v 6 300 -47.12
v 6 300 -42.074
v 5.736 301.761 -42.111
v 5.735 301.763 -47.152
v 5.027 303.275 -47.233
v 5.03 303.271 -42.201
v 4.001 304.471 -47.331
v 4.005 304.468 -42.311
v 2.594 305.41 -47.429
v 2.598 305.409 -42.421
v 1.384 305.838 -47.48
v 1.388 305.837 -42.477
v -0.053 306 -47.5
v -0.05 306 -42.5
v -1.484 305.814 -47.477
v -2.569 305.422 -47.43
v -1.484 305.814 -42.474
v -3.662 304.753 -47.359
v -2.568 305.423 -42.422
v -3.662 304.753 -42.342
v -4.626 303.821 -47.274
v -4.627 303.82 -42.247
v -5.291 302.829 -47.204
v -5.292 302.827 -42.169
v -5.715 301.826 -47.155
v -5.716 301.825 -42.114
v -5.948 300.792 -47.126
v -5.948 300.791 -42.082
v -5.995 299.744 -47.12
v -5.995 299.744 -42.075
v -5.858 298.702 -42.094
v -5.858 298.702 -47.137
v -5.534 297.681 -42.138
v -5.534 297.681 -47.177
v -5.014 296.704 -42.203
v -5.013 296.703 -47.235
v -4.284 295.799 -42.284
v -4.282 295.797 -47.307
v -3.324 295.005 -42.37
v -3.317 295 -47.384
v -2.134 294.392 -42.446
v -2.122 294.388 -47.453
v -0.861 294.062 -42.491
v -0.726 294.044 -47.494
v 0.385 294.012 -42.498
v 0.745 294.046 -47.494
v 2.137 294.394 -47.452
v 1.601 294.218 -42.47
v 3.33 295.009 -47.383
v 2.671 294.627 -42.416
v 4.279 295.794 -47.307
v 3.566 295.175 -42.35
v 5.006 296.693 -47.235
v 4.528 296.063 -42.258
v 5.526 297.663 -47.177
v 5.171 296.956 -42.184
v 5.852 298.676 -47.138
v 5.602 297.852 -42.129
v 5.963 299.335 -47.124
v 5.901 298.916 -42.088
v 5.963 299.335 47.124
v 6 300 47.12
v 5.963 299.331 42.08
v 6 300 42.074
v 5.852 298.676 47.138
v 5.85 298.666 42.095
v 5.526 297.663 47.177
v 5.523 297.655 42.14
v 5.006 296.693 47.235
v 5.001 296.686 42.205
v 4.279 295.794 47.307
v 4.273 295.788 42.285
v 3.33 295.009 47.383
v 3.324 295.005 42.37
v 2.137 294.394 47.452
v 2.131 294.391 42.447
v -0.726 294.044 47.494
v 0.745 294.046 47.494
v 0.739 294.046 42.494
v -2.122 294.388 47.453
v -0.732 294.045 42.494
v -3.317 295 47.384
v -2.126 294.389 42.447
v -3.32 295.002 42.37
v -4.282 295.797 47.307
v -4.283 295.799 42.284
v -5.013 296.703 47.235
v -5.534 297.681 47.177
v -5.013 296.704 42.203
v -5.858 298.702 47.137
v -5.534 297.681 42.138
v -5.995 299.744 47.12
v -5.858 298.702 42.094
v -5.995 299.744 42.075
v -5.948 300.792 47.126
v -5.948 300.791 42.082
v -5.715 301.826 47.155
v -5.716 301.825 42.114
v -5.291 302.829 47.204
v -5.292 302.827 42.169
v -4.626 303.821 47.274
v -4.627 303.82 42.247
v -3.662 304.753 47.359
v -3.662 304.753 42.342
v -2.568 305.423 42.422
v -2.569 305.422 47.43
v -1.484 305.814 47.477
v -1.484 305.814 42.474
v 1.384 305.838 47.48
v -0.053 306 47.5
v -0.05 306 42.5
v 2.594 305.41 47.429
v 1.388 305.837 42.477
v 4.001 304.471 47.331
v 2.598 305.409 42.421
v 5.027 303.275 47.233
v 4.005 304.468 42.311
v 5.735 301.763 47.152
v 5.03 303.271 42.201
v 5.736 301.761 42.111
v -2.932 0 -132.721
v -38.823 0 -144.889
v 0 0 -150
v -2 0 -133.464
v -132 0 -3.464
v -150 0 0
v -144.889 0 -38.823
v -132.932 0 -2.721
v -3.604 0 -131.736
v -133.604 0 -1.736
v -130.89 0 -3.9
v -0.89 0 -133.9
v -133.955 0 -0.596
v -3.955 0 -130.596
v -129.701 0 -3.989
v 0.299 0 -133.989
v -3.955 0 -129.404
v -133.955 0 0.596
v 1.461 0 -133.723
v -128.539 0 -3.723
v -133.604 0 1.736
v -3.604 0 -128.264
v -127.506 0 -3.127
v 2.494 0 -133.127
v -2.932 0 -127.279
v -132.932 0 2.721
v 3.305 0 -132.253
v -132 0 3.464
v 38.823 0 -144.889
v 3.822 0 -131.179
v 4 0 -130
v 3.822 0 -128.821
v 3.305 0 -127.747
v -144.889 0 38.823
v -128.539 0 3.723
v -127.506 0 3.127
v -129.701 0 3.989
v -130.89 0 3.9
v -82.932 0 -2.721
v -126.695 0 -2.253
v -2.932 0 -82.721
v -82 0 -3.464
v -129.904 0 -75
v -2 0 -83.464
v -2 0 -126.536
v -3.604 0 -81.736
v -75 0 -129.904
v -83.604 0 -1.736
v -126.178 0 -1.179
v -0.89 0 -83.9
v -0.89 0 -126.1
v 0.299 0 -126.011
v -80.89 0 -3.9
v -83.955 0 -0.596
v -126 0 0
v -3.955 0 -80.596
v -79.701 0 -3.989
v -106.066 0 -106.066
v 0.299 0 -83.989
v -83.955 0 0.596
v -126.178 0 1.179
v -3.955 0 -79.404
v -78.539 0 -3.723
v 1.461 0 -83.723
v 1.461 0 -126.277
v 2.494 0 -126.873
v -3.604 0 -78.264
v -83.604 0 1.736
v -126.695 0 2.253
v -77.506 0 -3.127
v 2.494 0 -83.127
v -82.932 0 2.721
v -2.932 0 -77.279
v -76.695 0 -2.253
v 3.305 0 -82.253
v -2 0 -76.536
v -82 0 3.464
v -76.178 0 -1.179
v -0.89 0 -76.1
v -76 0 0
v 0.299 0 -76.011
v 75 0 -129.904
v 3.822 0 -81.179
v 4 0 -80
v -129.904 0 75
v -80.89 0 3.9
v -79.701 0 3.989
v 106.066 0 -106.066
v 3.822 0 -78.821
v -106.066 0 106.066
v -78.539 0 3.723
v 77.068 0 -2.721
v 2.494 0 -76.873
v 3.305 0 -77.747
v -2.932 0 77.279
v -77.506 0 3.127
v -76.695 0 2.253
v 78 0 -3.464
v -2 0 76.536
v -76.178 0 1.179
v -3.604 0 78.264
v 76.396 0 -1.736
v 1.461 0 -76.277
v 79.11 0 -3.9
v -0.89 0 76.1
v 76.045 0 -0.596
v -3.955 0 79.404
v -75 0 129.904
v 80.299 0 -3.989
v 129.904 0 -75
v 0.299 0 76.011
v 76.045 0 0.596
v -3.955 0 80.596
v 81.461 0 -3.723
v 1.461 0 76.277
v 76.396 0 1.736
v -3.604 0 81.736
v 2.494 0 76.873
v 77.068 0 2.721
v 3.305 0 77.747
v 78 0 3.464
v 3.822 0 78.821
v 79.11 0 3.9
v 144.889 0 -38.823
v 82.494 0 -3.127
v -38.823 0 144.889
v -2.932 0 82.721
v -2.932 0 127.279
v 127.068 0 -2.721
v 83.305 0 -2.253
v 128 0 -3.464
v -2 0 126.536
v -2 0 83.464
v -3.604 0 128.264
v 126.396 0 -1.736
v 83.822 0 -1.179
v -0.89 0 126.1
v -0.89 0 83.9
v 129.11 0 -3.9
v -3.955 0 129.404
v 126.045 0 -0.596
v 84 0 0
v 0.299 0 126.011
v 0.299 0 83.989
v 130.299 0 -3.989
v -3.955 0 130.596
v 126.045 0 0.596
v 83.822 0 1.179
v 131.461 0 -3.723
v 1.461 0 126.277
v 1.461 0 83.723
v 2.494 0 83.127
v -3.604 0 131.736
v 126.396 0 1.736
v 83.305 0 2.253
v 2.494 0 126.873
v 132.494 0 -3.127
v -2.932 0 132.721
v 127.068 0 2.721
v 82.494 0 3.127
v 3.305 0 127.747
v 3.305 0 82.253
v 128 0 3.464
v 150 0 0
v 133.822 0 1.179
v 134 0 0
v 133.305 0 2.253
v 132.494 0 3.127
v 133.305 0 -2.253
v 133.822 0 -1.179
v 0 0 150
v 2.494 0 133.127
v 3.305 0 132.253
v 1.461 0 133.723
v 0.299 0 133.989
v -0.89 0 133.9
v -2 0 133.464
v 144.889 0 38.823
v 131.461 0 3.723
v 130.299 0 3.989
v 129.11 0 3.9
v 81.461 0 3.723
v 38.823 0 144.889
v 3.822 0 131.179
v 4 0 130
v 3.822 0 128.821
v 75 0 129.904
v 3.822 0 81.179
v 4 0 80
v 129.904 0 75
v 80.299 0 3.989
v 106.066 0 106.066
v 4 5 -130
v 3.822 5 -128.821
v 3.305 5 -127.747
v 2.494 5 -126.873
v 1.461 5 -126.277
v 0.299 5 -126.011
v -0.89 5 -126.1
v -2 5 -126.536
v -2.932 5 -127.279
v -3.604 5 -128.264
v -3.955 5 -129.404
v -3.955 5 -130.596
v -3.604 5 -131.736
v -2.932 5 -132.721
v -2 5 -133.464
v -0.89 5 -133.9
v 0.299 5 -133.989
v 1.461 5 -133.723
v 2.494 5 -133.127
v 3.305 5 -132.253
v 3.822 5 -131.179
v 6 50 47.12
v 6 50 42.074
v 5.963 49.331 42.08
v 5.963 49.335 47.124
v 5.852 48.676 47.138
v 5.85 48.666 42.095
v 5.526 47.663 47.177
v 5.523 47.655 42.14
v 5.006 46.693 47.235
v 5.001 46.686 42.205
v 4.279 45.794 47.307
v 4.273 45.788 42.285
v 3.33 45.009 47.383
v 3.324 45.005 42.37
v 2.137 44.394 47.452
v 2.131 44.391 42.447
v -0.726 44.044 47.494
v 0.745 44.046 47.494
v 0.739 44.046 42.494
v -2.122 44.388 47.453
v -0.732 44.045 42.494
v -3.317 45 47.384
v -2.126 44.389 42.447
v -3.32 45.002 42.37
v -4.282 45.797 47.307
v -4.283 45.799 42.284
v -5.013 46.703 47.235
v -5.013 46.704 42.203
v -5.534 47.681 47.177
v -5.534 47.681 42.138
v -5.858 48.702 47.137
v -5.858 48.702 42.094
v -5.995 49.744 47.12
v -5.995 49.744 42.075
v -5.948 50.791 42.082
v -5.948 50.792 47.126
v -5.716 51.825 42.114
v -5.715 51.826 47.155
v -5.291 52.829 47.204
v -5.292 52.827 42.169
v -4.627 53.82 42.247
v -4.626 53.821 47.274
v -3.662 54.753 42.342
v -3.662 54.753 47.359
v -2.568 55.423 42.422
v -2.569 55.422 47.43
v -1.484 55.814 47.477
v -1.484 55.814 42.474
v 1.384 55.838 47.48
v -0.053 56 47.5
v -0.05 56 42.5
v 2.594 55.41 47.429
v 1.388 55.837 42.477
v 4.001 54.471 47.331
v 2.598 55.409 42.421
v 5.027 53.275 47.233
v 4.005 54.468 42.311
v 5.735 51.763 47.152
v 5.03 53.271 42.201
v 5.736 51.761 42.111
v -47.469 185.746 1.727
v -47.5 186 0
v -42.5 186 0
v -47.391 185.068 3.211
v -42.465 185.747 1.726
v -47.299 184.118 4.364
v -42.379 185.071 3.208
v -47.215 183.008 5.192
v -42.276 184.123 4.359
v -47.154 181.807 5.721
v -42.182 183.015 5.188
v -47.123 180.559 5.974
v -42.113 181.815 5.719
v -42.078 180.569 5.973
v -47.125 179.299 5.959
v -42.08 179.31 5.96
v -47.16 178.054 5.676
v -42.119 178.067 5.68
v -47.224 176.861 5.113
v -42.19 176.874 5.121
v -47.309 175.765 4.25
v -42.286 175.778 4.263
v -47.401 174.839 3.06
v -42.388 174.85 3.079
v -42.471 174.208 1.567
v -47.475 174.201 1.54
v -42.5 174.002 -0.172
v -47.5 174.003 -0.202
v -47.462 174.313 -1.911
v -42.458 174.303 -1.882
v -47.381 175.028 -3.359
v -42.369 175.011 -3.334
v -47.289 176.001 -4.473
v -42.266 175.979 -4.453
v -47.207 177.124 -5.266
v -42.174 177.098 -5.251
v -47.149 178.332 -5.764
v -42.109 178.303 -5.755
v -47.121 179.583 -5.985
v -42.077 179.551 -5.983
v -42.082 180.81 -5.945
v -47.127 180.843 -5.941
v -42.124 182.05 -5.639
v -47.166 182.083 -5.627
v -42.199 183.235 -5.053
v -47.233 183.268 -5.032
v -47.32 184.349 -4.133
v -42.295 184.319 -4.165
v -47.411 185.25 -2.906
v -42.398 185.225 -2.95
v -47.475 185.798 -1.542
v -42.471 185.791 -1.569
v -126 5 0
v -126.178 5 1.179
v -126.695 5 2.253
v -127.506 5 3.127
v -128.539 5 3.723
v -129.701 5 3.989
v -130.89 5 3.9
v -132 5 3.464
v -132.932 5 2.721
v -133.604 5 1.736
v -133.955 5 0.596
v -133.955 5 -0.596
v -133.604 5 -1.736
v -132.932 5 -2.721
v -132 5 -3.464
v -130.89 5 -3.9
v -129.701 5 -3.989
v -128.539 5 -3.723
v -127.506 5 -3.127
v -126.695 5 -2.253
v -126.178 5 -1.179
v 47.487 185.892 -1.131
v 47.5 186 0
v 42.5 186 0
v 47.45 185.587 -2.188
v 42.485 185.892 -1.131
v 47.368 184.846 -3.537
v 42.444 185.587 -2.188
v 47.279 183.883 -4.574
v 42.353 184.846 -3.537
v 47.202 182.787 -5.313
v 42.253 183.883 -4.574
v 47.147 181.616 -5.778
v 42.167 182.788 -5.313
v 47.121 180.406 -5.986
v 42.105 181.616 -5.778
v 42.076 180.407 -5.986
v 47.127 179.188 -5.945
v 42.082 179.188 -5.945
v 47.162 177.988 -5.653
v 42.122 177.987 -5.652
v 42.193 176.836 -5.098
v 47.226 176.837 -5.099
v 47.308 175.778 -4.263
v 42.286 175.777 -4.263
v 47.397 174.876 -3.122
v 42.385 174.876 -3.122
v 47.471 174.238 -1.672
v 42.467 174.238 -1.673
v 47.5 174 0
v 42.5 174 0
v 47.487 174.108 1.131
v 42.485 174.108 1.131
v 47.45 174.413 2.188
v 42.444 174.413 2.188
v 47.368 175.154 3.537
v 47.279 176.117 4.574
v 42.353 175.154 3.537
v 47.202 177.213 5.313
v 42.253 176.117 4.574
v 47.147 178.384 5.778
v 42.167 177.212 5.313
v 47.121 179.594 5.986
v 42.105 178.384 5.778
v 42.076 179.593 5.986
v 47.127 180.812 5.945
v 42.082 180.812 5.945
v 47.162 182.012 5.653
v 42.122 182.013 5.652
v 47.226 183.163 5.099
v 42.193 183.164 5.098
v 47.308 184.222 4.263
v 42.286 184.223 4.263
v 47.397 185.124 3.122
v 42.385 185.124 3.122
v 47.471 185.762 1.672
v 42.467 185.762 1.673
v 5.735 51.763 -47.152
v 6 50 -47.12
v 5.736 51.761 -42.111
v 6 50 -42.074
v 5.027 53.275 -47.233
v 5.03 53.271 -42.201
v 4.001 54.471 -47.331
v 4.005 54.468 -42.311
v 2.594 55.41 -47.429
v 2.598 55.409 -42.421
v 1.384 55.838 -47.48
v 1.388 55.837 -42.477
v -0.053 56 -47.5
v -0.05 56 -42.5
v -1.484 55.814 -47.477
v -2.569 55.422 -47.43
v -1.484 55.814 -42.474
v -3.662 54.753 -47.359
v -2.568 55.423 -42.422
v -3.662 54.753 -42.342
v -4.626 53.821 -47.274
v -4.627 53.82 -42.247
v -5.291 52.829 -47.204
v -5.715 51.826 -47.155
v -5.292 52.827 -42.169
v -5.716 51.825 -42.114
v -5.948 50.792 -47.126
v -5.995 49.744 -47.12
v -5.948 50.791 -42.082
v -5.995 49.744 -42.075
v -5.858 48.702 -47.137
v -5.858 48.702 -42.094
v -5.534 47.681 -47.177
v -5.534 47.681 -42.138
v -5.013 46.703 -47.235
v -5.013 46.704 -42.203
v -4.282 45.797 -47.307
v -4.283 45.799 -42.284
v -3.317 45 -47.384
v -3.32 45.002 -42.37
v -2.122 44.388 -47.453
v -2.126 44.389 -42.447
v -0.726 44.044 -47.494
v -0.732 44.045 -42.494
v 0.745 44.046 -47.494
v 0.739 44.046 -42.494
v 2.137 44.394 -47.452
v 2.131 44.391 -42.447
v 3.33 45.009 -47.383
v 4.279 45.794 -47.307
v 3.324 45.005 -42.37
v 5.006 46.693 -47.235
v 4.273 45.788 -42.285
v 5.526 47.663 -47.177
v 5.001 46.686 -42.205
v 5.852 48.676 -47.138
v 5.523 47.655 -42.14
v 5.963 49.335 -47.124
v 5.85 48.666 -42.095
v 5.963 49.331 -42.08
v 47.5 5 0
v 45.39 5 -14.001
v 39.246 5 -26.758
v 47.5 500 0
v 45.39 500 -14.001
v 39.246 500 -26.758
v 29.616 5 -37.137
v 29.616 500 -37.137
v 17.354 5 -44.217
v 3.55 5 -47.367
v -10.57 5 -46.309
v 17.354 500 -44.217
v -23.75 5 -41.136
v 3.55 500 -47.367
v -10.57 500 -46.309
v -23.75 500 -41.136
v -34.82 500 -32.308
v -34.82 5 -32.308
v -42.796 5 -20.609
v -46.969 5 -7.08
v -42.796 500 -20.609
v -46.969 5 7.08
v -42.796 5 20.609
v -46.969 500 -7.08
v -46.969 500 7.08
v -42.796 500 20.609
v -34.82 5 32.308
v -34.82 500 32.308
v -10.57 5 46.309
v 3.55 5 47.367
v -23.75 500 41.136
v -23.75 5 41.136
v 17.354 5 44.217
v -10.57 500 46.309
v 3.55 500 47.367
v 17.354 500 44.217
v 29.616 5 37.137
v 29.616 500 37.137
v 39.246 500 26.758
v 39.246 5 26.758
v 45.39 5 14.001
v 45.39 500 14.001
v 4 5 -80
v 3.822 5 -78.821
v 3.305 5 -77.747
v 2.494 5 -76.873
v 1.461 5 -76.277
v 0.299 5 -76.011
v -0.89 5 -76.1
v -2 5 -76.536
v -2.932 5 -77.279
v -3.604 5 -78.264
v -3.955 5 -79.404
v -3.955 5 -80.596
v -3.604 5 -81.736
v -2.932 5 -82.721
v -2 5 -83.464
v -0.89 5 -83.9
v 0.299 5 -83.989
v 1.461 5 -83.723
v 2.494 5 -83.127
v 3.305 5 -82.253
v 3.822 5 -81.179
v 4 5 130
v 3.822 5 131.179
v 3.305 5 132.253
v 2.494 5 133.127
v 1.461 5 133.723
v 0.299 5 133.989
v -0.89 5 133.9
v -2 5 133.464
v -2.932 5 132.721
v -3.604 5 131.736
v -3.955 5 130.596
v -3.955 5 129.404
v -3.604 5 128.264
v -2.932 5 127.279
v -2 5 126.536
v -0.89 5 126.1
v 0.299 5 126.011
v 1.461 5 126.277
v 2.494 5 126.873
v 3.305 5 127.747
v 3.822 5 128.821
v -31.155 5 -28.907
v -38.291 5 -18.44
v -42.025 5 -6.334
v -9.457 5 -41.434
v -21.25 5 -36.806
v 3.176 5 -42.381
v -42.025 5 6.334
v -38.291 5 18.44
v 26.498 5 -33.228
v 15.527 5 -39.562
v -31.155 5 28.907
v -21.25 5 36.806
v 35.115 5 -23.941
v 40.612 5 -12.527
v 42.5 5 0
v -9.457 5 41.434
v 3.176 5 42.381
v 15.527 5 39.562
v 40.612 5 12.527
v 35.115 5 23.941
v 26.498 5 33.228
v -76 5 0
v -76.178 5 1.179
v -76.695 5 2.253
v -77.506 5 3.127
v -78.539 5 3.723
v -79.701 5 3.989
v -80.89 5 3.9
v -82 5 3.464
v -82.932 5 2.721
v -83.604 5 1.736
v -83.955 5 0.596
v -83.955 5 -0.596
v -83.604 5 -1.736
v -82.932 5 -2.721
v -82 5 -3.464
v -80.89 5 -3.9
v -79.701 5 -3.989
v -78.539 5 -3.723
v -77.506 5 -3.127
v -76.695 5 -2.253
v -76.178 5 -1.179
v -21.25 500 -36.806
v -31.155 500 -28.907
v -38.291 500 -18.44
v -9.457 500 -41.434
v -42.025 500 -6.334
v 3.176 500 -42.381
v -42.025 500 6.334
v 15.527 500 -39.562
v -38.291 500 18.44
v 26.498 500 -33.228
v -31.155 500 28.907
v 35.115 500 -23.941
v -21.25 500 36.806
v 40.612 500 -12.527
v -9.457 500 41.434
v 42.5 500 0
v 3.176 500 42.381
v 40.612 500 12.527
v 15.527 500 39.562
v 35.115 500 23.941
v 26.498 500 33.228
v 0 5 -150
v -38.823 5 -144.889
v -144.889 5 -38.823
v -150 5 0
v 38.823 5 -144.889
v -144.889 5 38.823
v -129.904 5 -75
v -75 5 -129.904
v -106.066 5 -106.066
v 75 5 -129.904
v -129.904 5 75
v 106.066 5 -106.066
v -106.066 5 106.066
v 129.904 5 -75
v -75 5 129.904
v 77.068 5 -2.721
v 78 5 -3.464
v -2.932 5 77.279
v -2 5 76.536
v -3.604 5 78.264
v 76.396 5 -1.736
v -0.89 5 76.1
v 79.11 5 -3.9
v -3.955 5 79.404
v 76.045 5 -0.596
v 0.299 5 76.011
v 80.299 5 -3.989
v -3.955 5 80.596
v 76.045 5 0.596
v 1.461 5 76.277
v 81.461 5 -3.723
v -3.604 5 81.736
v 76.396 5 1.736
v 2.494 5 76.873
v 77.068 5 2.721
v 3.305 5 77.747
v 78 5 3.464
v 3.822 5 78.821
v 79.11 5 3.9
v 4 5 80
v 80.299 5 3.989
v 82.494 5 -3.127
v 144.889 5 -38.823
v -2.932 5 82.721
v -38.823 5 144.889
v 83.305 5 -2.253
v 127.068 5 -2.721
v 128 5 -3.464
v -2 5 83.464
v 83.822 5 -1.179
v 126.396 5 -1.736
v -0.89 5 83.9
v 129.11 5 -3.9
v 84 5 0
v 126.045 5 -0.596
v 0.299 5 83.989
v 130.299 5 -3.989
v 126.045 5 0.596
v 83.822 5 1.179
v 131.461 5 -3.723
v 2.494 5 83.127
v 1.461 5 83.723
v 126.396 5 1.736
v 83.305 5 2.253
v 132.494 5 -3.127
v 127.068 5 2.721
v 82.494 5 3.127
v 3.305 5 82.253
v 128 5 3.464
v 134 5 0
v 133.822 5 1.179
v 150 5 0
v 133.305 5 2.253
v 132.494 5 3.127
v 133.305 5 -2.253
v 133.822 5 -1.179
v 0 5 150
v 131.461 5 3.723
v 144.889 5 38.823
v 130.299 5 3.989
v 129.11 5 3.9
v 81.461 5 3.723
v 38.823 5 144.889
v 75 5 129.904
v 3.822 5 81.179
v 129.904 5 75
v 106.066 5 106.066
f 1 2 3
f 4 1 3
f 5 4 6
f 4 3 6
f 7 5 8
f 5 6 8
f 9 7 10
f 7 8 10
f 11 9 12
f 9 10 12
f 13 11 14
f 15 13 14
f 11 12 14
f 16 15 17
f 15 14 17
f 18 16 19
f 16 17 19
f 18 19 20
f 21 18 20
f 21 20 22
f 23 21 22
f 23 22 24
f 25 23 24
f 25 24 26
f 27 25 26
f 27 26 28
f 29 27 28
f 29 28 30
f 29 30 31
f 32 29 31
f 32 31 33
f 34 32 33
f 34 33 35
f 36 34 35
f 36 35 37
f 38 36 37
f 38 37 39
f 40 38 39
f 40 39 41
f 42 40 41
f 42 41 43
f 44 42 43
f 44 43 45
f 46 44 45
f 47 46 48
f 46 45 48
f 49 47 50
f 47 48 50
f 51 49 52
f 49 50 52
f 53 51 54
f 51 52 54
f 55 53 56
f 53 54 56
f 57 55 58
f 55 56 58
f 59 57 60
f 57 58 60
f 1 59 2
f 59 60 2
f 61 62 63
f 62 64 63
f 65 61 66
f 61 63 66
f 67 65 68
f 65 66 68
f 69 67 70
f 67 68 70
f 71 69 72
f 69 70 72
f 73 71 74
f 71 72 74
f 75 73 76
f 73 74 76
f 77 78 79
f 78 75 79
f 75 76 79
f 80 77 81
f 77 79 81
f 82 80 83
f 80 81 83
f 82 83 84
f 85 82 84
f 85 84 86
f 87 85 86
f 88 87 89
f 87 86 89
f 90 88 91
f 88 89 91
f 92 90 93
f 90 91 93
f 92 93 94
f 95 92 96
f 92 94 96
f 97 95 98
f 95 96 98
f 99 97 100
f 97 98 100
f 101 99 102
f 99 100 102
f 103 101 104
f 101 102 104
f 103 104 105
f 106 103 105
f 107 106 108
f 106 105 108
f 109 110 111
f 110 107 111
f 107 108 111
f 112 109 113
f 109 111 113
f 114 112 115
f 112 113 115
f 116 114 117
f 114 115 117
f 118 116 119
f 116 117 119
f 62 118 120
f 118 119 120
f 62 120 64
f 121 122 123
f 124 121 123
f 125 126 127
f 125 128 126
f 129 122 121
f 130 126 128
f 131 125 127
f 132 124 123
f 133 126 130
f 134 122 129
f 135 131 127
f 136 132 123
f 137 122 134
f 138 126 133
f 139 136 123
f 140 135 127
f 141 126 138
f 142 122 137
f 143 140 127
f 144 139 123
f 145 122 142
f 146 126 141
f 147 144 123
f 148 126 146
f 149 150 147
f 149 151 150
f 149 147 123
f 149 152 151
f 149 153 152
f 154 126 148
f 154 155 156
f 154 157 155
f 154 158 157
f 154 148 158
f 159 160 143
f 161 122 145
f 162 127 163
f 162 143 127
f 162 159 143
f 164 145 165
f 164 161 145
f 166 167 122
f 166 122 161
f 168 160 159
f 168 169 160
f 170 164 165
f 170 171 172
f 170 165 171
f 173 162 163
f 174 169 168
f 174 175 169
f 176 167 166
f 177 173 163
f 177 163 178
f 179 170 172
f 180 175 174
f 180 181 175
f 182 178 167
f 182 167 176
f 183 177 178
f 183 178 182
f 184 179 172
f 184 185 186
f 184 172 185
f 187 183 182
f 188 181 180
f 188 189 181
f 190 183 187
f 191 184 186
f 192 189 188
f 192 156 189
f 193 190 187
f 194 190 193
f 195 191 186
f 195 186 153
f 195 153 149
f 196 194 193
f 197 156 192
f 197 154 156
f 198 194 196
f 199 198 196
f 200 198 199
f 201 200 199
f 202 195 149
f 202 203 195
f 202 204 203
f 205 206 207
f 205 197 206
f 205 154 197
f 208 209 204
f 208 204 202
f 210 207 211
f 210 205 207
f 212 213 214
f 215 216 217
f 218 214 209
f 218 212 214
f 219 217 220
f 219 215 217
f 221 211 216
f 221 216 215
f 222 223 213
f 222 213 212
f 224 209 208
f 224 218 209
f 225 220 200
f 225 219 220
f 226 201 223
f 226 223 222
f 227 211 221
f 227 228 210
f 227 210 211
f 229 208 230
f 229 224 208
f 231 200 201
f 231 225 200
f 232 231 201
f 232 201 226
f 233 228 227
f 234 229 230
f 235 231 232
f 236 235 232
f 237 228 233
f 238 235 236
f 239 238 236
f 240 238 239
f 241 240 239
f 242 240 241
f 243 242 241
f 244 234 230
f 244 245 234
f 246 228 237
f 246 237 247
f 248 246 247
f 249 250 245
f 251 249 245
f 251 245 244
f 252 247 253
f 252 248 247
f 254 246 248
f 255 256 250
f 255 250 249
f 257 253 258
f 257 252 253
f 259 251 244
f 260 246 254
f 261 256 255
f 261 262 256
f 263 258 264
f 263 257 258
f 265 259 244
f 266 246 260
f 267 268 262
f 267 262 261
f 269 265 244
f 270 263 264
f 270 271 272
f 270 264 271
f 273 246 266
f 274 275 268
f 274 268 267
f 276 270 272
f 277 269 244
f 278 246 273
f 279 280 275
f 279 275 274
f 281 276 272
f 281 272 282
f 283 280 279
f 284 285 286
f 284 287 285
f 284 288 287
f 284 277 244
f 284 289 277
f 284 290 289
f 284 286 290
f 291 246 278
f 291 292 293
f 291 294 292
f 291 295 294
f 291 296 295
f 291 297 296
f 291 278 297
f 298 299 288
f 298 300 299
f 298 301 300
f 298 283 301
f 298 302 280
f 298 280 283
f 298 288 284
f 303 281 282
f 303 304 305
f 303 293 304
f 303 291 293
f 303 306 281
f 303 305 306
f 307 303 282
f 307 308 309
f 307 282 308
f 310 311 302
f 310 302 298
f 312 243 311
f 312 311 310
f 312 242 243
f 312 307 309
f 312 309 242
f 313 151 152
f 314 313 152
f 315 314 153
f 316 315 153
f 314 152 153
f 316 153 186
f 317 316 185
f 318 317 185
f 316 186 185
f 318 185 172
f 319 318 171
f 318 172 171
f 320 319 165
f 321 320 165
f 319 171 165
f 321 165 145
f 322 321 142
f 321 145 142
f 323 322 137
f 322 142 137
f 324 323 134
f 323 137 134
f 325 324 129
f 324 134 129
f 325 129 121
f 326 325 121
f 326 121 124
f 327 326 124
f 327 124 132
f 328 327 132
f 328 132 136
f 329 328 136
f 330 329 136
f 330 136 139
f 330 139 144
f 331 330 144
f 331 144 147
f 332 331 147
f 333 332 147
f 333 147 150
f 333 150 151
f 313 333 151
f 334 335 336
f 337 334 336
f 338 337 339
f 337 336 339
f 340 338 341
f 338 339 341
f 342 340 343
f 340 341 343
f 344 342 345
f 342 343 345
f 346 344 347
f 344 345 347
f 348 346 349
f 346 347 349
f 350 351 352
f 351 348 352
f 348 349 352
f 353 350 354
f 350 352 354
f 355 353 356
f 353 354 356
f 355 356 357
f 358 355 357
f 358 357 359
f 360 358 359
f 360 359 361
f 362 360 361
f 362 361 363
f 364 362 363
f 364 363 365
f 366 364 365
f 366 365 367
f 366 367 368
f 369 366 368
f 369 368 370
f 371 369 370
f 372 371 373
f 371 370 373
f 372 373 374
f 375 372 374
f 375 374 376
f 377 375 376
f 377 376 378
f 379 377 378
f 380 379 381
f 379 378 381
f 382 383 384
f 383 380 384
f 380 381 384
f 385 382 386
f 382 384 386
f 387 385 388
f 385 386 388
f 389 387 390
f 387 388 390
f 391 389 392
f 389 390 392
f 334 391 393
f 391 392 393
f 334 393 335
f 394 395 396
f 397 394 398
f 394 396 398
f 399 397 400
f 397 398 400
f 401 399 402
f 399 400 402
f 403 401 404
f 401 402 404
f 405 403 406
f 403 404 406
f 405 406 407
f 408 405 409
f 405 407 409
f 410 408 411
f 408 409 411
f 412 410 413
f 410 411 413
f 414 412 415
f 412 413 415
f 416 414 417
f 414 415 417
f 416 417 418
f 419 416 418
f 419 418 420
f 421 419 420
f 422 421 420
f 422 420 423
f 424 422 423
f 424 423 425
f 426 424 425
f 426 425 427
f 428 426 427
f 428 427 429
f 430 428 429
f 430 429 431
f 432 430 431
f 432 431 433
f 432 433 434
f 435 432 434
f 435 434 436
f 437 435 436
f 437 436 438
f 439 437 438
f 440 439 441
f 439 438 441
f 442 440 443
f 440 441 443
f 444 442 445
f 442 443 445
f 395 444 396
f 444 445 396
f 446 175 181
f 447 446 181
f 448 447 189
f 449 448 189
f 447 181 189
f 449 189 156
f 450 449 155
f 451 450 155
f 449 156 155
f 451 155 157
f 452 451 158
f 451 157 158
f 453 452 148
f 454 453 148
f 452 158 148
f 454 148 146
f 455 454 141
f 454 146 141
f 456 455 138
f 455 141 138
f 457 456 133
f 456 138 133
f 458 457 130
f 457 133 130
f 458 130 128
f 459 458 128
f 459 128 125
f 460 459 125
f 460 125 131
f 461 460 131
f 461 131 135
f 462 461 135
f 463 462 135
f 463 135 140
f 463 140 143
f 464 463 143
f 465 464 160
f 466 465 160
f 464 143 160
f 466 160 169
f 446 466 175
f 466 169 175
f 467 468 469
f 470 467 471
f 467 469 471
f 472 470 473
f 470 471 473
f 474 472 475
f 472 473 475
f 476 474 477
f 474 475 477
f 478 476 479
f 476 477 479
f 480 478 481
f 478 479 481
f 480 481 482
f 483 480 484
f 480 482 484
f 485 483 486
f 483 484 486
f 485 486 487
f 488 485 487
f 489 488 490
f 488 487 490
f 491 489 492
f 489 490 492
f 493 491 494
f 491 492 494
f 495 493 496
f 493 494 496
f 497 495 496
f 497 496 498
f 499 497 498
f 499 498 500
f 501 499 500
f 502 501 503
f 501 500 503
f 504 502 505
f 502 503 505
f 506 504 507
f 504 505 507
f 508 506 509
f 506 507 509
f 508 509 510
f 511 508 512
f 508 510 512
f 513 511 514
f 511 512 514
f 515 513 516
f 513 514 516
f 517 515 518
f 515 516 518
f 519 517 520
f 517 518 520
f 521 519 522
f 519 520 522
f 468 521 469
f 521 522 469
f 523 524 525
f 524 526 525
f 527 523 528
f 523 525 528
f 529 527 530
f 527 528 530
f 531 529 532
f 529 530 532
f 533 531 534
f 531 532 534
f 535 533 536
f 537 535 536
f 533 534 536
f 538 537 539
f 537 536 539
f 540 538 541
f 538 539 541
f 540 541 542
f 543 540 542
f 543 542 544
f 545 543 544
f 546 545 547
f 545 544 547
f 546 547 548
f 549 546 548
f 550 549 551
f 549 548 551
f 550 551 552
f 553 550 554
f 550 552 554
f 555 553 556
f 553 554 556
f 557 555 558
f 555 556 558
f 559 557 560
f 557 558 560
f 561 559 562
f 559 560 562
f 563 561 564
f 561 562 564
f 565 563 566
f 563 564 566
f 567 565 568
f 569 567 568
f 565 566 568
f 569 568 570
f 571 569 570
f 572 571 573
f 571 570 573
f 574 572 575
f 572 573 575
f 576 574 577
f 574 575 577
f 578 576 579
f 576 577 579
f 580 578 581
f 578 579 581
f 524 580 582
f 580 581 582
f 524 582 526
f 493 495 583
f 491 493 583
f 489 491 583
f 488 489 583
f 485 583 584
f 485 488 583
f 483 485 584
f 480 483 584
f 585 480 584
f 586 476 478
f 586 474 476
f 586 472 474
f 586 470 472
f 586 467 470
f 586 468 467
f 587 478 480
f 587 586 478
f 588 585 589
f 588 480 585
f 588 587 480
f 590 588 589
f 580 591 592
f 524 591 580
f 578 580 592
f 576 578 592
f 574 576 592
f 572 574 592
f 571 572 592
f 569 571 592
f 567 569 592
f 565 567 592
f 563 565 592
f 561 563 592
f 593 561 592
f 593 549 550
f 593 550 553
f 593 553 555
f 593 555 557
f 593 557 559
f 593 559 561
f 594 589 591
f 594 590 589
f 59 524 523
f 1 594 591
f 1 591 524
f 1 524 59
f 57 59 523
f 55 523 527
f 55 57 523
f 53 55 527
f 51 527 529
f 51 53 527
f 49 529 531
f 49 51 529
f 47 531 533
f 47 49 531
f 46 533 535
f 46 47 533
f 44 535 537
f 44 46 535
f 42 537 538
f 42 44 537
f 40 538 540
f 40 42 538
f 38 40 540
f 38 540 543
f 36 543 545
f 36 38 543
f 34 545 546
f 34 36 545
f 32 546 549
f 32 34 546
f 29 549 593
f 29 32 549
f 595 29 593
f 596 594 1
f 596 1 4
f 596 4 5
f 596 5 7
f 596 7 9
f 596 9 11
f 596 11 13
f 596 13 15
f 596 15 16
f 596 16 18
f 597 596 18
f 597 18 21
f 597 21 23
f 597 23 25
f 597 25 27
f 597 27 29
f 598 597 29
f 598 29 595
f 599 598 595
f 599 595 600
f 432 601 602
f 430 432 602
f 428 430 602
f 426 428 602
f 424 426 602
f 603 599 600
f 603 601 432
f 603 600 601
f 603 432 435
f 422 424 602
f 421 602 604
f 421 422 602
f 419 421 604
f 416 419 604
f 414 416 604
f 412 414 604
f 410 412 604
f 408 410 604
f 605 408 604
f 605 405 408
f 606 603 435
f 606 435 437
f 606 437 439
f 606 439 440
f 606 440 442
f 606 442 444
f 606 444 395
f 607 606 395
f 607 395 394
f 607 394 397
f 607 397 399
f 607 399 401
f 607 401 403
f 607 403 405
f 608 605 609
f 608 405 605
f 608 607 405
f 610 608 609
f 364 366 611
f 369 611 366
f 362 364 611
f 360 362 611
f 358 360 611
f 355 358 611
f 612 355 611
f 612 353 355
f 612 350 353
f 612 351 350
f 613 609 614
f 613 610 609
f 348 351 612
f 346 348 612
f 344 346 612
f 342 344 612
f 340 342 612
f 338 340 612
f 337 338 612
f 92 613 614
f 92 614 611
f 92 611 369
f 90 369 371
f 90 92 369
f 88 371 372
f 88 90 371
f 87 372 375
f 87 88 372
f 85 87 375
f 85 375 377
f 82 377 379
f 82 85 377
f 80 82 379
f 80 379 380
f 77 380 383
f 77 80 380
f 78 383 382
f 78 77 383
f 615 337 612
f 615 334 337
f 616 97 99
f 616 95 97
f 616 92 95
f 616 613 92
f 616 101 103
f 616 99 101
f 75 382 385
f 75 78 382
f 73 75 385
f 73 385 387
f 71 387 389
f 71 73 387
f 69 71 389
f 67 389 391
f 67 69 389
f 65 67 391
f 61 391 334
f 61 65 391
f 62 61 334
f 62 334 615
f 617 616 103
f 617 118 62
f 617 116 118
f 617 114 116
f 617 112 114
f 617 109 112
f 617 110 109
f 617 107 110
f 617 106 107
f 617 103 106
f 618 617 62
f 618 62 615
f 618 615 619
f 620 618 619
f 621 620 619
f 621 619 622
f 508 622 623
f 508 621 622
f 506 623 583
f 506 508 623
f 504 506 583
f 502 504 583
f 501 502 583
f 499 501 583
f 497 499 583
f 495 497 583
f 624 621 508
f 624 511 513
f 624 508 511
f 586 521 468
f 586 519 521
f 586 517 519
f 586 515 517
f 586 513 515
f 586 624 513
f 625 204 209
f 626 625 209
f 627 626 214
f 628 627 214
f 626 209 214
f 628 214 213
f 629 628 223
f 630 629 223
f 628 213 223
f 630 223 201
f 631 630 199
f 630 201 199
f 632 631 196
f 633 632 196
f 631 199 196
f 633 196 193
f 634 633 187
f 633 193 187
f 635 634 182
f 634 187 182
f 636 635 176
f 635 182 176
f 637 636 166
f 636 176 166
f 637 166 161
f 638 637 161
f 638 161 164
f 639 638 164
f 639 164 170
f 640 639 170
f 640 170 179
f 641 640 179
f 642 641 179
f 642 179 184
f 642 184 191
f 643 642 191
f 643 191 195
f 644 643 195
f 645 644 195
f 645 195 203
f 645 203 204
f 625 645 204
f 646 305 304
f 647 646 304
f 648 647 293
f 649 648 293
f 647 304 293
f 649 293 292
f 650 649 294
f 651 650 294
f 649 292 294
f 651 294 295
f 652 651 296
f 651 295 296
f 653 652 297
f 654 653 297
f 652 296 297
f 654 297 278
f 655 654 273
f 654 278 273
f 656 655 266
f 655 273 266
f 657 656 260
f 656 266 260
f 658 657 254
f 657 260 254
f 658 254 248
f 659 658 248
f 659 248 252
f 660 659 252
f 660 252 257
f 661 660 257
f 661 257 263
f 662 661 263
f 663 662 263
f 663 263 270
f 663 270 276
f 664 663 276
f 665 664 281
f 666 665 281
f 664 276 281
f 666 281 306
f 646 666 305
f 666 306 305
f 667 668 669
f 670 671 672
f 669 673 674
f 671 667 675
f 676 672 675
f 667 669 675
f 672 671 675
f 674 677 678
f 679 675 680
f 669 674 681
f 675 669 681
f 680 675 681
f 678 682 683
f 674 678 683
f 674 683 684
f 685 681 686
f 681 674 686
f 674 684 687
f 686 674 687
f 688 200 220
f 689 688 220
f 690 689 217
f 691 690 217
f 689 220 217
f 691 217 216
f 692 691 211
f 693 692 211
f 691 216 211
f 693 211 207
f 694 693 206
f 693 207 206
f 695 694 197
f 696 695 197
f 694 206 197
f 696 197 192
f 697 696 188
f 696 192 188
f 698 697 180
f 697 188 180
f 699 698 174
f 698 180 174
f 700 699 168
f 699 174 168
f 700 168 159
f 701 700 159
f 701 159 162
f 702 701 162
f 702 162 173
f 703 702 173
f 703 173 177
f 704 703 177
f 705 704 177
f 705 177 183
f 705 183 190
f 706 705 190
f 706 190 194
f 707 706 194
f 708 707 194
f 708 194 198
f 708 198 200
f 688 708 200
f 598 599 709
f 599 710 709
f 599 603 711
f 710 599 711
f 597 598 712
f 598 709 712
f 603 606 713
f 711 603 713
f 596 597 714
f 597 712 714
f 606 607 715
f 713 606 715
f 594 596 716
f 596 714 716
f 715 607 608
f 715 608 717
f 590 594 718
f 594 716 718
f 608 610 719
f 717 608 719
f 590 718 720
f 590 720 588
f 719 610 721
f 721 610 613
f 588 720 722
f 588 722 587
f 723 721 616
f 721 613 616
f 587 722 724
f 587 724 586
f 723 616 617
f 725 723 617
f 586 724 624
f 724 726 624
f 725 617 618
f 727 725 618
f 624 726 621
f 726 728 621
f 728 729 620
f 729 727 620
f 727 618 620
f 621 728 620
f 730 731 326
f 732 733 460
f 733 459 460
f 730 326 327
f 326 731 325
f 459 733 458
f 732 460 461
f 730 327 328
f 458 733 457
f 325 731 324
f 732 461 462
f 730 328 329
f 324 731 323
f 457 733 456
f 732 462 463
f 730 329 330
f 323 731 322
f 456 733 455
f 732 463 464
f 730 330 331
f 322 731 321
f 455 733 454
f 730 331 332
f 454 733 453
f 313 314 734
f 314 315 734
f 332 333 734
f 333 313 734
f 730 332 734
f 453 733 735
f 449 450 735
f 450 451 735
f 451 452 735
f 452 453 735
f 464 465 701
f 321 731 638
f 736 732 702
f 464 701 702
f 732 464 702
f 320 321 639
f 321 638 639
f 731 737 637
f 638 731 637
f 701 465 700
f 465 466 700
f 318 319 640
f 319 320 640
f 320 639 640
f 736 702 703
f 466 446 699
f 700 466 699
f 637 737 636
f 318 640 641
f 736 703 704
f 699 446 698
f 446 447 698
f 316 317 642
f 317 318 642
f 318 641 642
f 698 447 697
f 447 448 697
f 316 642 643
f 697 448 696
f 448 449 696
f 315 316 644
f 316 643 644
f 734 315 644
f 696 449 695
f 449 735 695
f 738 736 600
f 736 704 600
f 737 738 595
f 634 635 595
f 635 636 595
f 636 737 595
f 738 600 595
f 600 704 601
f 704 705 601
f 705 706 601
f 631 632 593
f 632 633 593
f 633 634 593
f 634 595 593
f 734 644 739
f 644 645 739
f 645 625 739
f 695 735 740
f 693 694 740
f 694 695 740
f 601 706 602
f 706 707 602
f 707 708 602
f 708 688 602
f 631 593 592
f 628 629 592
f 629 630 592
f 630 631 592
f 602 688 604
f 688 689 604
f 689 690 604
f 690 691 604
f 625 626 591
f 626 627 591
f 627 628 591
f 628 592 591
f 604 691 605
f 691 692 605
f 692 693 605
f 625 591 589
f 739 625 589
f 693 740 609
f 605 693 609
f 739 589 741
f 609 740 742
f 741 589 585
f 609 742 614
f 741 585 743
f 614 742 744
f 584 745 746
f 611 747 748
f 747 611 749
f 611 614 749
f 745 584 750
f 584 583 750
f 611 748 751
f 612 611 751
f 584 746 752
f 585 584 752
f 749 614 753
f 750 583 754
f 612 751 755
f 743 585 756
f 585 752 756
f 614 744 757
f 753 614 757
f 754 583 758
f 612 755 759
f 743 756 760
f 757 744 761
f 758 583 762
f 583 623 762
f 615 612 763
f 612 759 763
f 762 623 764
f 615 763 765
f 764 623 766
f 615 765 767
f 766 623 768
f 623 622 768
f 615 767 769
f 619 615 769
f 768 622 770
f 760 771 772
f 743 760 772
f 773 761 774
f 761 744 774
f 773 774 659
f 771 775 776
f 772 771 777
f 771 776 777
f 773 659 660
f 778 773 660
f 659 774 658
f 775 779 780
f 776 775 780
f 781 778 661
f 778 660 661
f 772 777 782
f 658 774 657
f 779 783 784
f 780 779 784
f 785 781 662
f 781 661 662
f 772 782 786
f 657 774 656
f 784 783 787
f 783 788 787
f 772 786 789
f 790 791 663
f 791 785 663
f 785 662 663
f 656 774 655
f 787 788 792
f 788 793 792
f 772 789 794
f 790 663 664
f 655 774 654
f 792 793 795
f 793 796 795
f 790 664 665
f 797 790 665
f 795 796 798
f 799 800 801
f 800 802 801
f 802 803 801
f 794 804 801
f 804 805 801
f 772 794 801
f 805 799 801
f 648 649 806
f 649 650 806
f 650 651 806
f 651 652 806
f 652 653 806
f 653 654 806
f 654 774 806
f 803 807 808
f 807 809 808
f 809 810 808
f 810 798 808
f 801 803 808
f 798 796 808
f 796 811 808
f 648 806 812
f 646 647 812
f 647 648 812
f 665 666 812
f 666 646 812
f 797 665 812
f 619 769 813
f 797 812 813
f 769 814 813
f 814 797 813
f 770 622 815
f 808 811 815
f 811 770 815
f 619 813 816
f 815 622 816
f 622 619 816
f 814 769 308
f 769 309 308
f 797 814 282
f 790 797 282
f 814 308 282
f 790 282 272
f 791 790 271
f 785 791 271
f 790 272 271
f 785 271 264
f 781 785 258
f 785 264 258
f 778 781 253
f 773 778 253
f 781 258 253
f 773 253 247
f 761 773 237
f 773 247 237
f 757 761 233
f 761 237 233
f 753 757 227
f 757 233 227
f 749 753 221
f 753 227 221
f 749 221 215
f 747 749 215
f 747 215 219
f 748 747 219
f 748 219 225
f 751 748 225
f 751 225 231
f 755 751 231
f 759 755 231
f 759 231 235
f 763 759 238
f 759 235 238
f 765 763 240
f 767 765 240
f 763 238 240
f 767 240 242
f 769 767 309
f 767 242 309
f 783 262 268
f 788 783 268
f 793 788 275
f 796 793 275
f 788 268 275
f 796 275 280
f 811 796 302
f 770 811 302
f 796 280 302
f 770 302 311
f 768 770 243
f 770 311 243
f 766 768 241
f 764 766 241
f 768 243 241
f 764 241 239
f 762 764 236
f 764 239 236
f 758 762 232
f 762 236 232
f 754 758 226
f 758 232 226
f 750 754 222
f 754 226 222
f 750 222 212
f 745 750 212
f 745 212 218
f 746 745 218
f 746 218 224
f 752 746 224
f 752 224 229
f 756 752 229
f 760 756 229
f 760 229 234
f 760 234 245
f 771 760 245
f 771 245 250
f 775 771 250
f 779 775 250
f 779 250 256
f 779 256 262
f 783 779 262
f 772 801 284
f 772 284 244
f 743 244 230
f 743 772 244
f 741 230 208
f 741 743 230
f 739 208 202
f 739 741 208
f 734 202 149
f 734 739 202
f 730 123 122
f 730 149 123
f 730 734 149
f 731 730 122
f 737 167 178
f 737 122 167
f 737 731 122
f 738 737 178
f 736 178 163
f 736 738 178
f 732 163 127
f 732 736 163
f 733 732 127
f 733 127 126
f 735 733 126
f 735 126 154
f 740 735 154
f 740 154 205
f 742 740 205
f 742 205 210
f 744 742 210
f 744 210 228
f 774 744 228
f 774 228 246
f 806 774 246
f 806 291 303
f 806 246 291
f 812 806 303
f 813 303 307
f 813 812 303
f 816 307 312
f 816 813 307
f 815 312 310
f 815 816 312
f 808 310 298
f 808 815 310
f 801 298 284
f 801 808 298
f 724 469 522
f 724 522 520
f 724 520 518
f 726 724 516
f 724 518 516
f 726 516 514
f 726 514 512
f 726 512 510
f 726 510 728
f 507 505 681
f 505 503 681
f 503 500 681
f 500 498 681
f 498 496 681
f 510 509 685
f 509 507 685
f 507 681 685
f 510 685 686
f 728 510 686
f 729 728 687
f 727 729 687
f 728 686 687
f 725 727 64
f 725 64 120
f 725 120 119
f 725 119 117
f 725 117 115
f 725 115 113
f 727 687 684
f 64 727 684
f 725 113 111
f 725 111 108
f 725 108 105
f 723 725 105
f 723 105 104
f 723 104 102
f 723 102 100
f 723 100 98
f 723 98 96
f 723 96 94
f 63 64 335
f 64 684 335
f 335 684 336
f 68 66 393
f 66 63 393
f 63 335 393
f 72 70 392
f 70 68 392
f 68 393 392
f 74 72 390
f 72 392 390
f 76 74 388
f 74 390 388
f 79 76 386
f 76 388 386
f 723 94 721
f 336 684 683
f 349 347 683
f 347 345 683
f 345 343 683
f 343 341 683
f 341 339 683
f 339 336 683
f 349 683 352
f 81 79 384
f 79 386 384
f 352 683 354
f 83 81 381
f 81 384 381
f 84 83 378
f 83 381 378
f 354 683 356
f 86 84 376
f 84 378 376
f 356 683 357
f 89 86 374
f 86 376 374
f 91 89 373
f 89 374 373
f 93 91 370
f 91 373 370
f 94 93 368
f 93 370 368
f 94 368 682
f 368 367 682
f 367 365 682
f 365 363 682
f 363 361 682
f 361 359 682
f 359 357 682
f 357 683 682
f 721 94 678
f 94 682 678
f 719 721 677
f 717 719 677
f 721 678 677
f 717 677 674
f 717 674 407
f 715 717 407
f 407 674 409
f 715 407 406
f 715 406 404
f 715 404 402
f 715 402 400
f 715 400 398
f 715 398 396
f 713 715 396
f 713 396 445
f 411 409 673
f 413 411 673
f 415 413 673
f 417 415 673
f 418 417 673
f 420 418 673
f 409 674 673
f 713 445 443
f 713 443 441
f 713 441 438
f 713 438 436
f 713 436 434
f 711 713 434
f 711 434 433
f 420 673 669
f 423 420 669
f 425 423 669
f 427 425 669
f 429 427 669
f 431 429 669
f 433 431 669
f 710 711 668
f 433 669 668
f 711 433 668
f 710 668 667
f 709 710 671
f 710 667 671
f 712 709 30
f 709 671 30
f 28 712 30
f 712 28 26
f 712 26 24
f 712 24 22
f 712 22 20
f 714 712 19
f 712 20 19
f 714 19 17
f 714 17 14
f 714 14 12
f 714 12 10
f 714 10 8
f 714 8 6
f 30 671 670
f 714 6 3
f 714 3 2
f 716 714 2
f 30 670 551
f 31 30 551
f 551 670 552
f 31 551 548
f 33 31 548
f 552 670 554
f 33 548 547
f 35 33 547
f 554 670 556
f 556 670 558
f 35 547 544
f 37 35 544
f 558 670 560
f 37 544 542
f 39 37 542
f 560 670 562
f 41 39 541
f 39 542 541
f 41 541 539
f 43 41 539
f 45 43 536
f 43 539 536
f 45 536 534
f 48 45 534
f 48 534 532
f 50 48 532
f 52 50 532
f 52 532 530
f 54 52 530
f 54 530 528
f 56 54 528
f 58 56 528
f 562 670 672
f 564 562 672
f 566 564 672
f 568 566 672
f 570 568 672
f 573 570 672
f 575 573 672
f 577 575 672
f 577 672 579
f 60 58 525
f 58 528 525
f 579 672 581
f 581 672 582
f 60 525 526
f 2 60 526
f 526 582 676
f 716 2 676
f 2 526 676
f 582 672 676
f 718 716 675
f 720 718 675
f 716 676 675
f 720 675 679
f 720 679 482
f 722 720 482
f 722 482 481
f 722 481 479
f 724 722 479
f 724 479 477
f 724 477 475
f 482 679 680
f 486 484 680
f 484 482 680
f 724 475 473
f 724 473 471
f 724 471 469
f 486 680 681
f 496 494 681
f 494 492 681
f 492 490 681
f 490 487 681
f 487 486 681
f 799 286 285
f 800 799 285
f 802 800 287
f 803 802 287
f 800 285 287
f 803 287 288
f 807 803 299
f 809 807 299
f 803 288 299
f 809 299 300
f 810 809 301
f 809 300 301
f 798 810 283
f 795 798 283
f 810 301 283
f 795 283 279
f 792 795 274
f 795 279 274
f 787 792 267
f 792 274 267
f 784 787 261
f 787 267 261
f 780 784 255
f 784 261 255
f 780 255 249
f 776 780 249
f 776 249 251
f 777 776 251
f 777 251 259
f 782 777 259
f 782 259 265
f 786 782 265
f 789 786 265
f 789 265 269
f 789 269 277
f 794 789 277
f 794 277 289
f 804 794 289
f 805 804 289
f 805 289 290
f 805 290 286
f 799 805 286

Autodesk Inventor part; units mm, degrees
ref_plane "YZ Plane" through (0, 0, 0) normal (1, 0, 0) x (0, 1, 0)
ref_plane "XZ Plane" through (0, 0, 0) normal (0, 1, 0) x (-1, 0, 0)
ref_plane "XY Plane" through (0, 0, 0) normal (0, 0, 1) x (1, 0, 0)
sketch "スケッチ1" plane through (0, 0, 0) normal (0, 0, 1) x (1, 0, 0)
  line L0 (0, 0) -> (150, 0)
  line L1 (150, 0) -> (150, 5)
  line L2 (150, 5) -> (0, 5)
  line L3 (0, 5) -> (0, 0)
  line L4 (42.5, 0) -> (47.5, 0)
  line L5 (47.5, 0) -> (47.5, 500)
  line L6 (47.5, 500) -> (42.5, 500)
  line L7 (42.5, 500) -> (42.5, 0)
  dimension "d1" = 47.5
  dimension "d2" = 150
  dimension "d3" = 5
  dimension "d4" = 5
  dimension "d5" = 500
revolve "回転1" add sketch "スケッチ1" angle 360 about axis through (0, 5, 0) along (0, -1, 0)
sketch "スケッチ2" plane through (0, 0, 0) normal (0, -1, 0) x (1, 0, 0)
  circle A0 centre (0, 0) radius 150 projected
  circle A1 centre (0, 130) radius 4
  circle A2 centre (0, 80) radius 4
  circle A3 centre (-130, 0) radius 4
  circle A4 centre (-80, 0) radius 4
  circle A5 centre (0, -130) radius 4
  circle A6 centre (0, -80) radius 4
  circle A7 centre (130, 0) radius 4
  circle A8 centre (80, 0) radius 4
  dimension "d7" = 8
  dimension "d8" = 130
  dimension "d9" = 80
  dimension "d12" = 360
extrude "押し出し1" cut sketch "スケッチ2" against normal through all keep common part
sketch "スケッチ3" plane through (0, 0, 0) normal (0, 0, 1) x (1, 0, 0)
  circle A0 centre (0, 50) radius 6
  circle A1 centre (0, 300) radius 6
  line L0 (-150, 0) -> (150, 0) projected
  point P0 (0, 0)
  dimension "d16" = 12
  dimension "d17" = 50
  dimension "d18" = 300
extrude "押し出し2" cut sketch "スケッチ3" along normal through all both and the other way through all
sketch "スケッチ4" plane through (0, 0, 0) normal (1, 0, 0) x (0, 1, 0)
  circle A0 centre (180, 0) radius 6
  line L0 (0, 4) -> (0, -4) projected
  point P0 (0, 0)
  dimension "d21" = 12
  dimension "d22" = 180
extrude "押し出し3" cut sketch "スケッチ4" along normal through all both and the other way through all
properties part number "Pole Base"
